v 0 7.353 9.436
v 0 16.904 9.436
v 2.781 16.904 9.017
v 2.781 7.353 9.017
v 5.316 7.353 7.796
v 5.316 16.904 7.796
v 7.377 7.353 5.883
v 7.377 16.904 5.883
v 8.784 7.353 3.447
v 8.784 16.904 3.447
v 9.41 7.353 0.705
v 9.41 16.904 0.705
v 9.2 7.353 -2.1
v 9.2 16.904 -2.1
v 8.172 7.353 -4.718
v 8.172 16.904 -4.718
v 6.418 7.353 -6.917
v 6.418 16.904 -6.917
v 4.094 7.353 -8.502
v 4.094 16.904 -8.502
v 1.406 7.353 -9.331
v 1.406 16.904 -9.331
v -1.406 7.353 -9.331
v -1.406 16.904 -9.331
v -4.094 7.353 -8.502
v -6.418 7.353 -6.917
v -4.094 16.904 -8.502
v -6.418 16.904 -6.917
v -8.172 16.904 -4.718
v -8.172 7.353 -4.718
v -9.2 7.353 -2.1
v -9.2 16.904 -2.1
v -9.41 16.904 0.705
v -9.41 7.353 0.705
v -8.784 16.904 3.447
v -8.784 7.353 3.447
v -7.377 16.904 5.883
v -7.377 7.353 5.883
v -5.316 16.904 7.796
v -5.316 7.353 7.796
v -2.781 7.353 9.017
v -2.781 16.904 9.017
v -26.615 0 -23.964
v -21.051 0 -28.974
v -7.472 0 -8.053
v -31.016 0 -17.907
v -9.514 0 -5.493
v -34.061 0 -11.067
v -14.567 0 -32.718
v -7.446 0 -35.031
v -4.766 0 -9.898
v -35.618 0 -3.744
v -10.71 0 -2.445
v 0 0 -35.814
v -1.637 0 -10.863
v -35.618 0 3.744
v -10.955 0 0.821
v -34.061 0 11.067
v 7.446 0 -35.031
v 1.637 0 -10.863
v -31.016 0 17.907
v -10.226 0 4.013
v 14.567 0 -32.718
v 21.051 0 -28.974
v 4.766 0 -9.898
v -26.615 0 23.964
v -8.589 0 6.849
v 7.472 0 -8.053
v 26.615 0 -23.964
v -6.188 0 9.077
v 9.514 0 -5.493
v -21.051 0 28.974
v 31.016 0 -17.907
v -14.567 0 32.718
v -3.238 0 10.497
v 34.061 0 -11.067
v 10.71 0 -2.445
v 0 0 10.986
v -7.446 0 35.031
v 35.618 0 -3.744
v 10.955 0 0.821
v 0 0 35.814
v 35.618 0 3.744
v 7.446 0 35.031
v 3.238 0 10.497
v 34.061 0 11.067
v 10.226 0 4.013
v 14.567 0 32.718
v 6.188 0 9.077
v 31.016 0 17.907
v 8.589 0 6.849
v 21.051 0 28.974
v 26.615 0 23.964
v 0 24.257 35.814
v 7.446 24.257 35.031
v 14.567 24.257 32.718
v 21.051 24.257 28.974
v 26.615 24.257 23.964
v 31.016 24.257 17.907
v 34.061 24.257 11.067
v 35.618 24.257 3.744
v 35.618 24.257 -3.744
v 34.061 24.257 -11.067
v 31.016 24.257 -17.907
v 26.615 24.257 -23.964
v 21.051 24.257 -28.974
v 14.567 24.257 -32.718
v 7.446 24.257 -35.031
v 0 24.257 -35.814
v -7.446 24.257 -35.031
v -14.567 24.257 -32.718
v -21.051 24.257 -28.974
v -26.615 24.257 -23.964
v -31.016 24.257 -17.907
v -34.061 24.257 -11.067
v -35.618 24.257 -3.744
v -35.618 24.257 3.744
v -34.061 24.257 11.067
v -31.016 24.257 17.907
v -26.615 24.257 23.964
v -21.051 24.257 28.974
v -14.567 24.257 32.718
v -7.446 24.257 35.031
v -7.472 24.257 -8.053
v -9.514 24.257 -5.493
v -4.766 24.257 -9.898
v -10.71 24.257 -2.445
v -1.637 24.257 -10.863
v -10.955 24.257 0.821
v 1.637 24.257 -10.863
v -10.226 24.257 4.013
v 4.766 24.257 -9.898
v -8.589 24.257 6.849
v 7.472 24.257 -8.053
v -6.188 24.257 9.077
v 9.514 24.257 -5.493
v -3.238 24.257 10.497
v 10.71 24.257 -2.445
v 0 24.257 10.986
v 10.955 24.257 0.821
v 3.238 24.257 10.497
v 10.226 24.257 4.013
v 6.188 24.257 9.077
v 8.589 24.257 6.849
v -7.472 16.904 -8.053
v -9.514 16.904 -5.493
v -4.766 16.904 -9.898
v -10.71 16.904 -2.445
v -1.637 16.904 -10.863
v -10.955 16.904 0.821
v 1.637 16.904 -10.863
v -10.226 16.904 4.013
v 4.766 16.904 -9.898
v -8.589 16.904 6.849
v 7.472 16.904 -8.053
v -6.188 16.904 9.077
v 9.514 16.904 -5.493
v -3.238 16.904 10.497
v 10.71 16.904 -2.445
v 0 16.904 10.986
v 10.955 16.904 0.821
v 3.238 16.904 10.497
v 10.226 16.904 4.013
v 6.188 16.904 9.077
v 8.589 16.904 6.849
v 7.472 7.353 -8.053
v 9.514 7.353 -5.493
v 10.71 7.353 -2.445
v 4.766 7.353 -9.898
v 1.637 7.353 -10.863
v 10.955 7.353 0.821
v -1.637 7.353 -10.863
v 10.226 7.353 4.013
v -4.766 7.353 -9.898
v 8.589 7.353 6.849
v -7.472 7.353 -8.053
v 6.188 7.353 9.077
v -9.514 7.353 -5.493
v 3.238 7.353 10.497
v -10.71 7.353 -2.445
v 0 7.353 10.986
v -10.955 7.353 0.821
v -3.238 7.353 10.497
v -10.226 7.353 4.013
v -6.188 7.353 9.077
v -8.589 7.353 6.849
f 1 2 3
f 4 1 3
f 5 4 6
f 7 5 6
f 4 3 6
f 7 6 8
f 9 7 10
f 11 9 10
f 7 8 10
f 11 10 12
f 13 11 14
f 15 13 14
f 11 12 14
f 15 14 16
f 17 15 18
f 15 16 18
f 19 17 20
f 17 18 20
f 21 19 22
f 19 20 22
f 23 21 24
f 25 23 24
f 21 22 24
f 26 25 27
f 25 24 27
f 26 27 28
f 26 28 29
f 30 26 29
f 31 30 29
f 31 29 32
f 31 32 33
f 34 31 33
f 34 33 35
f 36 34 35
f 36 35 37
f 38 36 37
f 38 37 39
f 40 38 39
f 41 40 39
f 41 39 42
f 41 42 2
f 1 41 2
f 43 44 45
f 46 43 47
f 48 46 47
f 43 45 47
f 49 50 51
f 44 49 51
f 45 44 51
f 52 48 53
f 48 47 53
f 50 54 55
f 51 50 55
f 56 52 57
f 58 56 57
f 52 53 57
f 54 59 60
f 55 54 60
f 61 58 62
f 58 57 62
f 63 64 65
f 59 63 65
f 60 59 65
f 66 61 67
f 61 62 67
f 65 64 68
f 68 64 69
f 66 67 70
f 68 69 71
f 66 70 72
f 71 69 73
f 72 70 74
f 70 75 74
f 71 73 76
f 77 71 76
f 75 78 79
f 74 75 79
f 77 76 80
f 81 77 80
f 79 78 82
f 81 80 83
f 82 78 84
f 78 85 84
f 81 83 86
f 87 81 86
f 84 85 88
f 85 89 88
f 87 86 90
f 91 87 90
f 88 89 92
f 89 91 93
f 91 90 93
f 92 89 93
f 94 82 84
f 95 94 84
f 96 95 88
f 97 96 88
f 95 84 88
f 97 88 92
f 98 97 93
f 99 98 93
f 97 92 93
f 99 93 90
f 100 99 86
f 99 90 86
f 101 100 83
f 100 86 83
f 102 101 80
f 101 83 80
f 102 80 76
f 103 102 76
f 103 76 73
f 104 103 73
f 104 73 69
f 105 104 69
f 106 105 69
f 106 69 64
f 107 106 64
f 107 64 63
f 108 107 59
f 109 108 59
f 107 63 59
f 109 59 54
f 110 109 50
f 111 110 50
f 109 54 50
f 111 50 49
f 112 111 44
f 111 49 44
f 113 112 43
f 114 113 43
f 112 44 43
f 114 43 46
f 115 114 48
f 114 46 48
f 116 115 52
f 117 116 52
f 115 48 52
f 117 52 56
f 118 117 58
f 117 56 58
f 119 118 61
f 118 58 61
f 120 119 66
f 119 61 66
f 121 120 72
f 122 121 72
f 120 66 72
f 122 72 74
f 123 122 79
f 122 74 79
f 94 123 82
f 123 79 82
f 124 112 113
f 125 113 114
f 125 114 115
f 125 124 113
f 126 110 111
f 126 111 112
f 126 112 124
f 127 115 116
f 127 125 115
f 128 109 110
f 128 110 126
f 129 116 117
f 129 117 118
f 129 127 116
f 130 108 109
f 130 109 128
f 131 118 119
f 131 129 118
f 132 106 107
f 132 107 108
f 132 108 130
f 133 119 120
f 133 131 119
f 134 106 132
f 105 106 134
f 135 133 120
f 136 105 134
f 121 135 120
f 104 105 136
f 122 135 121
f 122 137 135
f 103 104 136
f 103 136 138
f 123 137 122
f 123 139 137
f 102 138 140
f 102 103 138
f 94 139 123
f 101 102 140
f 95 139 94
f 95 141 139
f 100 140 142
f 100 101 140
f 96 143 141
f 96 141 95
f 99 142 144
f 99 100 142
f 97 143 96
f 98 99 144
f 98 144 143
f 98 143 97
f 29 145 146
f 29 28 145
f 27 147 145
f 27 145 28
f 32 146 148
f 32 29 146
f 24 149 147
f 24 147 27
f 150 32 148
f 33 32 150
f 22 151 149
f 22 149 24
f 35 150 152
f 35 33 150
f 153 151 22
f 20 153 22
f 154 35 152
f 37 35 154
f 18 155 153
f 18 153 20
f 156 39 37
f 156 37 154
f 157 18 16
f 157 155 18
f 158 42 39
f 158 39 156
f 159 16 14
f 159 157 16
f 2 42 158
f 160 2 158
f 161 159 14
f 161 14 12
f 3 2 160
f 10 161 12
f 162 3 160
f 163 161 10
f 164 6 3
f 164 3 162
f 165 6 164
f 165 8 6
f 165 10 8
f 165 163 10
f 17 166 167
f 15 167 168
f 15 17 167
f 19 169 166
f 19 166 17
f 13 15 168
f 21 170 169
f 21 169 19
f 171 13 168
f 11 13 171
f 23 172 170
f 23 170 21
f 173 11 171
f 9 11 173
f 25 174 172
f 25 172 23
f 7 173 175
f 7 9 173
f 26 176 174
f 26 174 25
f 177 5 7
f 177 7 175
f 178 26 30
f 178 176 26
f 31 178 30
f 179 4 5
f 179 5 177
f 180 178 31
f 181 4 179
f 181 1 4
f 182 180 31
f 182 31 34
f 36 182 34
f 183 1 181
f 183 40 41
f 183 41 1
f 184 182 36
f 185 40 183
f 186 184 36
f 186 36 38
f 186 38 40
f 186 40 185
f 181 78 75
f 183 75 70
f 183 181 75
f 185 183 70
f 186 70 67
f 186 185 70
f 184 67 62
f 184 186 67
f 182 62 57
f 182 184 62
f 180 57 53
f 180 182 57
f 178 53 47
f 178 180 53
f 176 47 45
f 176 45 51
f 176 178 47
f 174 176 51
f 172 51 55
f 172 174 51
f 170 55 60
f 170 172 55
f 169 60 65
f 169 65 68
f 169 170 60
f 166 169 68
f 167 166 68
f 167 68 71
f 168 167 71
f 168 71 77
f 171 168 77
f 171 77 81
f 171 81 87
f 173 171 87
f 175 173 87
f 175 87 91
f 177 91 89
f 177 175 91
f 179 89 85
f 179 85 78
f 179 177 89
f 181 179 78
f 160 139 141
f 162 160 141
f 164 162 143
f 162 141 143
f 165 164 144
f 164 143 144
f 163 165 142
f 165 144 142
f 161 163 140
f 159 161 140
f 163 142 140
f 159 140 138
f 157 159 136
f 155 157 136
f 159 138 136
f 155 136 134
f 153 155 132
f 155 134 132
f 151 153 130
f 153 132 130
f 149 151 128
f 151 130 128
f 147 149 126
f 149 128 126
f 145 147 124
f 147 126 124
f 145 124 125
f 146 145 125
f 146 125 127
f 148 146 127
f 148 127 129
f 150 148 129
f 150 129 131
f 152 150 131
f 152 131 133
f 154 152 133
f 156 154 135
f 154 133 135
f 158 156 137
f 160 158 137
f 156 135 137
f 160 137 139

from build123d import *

# Parameters (mm, degrees)
SKETCH1_R           = 35.814
BOSS_EXTRUDE1_DEPTH = 24.257
SKETCH2_R           = 9.4361
CUT_EXTRUDE1_DEPTH  = 57.157699748
SKETCH3_R           = 10.9855
CUT_EXTRUDE2_DEPTH  = 7.3533
CUT_EXTRUDE3_START  = -7.3533
SKETCH4_R           = 10.9855
CUT_EXTRUDE3_DEPTH  = 7.3533


with BuildPart() as part:
    # Sketch1 → Boss-Extrude1 (new body)
    with BuildSketch(Plane(origin=(0, 0, 0), x_dir=(1, 0, 0), z_dir=(0, 1, 0))):
        with Locations(Location((0, 0, 0), (0, 0, 270))):
            Circle(SKETCH1_R)
    extrude(amount=BOSS_EXTRUDE1_DEPTH)

    # Sketch2 → Cut-Extrude1 (cut, through all)
    with BuildSketch(Plane(origin=(0, 24.257, 0), x_dir=(1, 0, 0), z_dir=(0, 1, 0))):
        with Locations(Location((0, 0, 0), (0, 0, 270))):
            Circle(SKETCH2_R)
    extrude(amount=-CUT_EXTRUDE1_DEPTH, mode=Mode.SUBTRACT)

    # Sketch3 → Cut-Extrude2 (cut)
    with BuildSketch(Plane(origin=(0, 24.257, 0), x_dir=(1, 0, 0), z_dir=(0, 1, 0))):
        with Locations(Location((0, 0, 0), (0, 0, 270))):
            Circle(SKETCH3_R)
    extrude(amount=-CUT_EXTRUDE2_DEPTH, mode=Mode.SUBTRACT)

    # Sketch4 → Cut-Extrude3 (cut)
    with BuildSketch(Plane.XZ.offset(CUT_EXTRUDE3_START)):
        with Locations(Location((0, 0, 0), (0, 0, 90))):
            Circle(SKETCH4_R)
    extrude(amount=CUT_EXTRUDE3_DEPTH, mode=Mode.SUBTRACT)


solid = part.part
